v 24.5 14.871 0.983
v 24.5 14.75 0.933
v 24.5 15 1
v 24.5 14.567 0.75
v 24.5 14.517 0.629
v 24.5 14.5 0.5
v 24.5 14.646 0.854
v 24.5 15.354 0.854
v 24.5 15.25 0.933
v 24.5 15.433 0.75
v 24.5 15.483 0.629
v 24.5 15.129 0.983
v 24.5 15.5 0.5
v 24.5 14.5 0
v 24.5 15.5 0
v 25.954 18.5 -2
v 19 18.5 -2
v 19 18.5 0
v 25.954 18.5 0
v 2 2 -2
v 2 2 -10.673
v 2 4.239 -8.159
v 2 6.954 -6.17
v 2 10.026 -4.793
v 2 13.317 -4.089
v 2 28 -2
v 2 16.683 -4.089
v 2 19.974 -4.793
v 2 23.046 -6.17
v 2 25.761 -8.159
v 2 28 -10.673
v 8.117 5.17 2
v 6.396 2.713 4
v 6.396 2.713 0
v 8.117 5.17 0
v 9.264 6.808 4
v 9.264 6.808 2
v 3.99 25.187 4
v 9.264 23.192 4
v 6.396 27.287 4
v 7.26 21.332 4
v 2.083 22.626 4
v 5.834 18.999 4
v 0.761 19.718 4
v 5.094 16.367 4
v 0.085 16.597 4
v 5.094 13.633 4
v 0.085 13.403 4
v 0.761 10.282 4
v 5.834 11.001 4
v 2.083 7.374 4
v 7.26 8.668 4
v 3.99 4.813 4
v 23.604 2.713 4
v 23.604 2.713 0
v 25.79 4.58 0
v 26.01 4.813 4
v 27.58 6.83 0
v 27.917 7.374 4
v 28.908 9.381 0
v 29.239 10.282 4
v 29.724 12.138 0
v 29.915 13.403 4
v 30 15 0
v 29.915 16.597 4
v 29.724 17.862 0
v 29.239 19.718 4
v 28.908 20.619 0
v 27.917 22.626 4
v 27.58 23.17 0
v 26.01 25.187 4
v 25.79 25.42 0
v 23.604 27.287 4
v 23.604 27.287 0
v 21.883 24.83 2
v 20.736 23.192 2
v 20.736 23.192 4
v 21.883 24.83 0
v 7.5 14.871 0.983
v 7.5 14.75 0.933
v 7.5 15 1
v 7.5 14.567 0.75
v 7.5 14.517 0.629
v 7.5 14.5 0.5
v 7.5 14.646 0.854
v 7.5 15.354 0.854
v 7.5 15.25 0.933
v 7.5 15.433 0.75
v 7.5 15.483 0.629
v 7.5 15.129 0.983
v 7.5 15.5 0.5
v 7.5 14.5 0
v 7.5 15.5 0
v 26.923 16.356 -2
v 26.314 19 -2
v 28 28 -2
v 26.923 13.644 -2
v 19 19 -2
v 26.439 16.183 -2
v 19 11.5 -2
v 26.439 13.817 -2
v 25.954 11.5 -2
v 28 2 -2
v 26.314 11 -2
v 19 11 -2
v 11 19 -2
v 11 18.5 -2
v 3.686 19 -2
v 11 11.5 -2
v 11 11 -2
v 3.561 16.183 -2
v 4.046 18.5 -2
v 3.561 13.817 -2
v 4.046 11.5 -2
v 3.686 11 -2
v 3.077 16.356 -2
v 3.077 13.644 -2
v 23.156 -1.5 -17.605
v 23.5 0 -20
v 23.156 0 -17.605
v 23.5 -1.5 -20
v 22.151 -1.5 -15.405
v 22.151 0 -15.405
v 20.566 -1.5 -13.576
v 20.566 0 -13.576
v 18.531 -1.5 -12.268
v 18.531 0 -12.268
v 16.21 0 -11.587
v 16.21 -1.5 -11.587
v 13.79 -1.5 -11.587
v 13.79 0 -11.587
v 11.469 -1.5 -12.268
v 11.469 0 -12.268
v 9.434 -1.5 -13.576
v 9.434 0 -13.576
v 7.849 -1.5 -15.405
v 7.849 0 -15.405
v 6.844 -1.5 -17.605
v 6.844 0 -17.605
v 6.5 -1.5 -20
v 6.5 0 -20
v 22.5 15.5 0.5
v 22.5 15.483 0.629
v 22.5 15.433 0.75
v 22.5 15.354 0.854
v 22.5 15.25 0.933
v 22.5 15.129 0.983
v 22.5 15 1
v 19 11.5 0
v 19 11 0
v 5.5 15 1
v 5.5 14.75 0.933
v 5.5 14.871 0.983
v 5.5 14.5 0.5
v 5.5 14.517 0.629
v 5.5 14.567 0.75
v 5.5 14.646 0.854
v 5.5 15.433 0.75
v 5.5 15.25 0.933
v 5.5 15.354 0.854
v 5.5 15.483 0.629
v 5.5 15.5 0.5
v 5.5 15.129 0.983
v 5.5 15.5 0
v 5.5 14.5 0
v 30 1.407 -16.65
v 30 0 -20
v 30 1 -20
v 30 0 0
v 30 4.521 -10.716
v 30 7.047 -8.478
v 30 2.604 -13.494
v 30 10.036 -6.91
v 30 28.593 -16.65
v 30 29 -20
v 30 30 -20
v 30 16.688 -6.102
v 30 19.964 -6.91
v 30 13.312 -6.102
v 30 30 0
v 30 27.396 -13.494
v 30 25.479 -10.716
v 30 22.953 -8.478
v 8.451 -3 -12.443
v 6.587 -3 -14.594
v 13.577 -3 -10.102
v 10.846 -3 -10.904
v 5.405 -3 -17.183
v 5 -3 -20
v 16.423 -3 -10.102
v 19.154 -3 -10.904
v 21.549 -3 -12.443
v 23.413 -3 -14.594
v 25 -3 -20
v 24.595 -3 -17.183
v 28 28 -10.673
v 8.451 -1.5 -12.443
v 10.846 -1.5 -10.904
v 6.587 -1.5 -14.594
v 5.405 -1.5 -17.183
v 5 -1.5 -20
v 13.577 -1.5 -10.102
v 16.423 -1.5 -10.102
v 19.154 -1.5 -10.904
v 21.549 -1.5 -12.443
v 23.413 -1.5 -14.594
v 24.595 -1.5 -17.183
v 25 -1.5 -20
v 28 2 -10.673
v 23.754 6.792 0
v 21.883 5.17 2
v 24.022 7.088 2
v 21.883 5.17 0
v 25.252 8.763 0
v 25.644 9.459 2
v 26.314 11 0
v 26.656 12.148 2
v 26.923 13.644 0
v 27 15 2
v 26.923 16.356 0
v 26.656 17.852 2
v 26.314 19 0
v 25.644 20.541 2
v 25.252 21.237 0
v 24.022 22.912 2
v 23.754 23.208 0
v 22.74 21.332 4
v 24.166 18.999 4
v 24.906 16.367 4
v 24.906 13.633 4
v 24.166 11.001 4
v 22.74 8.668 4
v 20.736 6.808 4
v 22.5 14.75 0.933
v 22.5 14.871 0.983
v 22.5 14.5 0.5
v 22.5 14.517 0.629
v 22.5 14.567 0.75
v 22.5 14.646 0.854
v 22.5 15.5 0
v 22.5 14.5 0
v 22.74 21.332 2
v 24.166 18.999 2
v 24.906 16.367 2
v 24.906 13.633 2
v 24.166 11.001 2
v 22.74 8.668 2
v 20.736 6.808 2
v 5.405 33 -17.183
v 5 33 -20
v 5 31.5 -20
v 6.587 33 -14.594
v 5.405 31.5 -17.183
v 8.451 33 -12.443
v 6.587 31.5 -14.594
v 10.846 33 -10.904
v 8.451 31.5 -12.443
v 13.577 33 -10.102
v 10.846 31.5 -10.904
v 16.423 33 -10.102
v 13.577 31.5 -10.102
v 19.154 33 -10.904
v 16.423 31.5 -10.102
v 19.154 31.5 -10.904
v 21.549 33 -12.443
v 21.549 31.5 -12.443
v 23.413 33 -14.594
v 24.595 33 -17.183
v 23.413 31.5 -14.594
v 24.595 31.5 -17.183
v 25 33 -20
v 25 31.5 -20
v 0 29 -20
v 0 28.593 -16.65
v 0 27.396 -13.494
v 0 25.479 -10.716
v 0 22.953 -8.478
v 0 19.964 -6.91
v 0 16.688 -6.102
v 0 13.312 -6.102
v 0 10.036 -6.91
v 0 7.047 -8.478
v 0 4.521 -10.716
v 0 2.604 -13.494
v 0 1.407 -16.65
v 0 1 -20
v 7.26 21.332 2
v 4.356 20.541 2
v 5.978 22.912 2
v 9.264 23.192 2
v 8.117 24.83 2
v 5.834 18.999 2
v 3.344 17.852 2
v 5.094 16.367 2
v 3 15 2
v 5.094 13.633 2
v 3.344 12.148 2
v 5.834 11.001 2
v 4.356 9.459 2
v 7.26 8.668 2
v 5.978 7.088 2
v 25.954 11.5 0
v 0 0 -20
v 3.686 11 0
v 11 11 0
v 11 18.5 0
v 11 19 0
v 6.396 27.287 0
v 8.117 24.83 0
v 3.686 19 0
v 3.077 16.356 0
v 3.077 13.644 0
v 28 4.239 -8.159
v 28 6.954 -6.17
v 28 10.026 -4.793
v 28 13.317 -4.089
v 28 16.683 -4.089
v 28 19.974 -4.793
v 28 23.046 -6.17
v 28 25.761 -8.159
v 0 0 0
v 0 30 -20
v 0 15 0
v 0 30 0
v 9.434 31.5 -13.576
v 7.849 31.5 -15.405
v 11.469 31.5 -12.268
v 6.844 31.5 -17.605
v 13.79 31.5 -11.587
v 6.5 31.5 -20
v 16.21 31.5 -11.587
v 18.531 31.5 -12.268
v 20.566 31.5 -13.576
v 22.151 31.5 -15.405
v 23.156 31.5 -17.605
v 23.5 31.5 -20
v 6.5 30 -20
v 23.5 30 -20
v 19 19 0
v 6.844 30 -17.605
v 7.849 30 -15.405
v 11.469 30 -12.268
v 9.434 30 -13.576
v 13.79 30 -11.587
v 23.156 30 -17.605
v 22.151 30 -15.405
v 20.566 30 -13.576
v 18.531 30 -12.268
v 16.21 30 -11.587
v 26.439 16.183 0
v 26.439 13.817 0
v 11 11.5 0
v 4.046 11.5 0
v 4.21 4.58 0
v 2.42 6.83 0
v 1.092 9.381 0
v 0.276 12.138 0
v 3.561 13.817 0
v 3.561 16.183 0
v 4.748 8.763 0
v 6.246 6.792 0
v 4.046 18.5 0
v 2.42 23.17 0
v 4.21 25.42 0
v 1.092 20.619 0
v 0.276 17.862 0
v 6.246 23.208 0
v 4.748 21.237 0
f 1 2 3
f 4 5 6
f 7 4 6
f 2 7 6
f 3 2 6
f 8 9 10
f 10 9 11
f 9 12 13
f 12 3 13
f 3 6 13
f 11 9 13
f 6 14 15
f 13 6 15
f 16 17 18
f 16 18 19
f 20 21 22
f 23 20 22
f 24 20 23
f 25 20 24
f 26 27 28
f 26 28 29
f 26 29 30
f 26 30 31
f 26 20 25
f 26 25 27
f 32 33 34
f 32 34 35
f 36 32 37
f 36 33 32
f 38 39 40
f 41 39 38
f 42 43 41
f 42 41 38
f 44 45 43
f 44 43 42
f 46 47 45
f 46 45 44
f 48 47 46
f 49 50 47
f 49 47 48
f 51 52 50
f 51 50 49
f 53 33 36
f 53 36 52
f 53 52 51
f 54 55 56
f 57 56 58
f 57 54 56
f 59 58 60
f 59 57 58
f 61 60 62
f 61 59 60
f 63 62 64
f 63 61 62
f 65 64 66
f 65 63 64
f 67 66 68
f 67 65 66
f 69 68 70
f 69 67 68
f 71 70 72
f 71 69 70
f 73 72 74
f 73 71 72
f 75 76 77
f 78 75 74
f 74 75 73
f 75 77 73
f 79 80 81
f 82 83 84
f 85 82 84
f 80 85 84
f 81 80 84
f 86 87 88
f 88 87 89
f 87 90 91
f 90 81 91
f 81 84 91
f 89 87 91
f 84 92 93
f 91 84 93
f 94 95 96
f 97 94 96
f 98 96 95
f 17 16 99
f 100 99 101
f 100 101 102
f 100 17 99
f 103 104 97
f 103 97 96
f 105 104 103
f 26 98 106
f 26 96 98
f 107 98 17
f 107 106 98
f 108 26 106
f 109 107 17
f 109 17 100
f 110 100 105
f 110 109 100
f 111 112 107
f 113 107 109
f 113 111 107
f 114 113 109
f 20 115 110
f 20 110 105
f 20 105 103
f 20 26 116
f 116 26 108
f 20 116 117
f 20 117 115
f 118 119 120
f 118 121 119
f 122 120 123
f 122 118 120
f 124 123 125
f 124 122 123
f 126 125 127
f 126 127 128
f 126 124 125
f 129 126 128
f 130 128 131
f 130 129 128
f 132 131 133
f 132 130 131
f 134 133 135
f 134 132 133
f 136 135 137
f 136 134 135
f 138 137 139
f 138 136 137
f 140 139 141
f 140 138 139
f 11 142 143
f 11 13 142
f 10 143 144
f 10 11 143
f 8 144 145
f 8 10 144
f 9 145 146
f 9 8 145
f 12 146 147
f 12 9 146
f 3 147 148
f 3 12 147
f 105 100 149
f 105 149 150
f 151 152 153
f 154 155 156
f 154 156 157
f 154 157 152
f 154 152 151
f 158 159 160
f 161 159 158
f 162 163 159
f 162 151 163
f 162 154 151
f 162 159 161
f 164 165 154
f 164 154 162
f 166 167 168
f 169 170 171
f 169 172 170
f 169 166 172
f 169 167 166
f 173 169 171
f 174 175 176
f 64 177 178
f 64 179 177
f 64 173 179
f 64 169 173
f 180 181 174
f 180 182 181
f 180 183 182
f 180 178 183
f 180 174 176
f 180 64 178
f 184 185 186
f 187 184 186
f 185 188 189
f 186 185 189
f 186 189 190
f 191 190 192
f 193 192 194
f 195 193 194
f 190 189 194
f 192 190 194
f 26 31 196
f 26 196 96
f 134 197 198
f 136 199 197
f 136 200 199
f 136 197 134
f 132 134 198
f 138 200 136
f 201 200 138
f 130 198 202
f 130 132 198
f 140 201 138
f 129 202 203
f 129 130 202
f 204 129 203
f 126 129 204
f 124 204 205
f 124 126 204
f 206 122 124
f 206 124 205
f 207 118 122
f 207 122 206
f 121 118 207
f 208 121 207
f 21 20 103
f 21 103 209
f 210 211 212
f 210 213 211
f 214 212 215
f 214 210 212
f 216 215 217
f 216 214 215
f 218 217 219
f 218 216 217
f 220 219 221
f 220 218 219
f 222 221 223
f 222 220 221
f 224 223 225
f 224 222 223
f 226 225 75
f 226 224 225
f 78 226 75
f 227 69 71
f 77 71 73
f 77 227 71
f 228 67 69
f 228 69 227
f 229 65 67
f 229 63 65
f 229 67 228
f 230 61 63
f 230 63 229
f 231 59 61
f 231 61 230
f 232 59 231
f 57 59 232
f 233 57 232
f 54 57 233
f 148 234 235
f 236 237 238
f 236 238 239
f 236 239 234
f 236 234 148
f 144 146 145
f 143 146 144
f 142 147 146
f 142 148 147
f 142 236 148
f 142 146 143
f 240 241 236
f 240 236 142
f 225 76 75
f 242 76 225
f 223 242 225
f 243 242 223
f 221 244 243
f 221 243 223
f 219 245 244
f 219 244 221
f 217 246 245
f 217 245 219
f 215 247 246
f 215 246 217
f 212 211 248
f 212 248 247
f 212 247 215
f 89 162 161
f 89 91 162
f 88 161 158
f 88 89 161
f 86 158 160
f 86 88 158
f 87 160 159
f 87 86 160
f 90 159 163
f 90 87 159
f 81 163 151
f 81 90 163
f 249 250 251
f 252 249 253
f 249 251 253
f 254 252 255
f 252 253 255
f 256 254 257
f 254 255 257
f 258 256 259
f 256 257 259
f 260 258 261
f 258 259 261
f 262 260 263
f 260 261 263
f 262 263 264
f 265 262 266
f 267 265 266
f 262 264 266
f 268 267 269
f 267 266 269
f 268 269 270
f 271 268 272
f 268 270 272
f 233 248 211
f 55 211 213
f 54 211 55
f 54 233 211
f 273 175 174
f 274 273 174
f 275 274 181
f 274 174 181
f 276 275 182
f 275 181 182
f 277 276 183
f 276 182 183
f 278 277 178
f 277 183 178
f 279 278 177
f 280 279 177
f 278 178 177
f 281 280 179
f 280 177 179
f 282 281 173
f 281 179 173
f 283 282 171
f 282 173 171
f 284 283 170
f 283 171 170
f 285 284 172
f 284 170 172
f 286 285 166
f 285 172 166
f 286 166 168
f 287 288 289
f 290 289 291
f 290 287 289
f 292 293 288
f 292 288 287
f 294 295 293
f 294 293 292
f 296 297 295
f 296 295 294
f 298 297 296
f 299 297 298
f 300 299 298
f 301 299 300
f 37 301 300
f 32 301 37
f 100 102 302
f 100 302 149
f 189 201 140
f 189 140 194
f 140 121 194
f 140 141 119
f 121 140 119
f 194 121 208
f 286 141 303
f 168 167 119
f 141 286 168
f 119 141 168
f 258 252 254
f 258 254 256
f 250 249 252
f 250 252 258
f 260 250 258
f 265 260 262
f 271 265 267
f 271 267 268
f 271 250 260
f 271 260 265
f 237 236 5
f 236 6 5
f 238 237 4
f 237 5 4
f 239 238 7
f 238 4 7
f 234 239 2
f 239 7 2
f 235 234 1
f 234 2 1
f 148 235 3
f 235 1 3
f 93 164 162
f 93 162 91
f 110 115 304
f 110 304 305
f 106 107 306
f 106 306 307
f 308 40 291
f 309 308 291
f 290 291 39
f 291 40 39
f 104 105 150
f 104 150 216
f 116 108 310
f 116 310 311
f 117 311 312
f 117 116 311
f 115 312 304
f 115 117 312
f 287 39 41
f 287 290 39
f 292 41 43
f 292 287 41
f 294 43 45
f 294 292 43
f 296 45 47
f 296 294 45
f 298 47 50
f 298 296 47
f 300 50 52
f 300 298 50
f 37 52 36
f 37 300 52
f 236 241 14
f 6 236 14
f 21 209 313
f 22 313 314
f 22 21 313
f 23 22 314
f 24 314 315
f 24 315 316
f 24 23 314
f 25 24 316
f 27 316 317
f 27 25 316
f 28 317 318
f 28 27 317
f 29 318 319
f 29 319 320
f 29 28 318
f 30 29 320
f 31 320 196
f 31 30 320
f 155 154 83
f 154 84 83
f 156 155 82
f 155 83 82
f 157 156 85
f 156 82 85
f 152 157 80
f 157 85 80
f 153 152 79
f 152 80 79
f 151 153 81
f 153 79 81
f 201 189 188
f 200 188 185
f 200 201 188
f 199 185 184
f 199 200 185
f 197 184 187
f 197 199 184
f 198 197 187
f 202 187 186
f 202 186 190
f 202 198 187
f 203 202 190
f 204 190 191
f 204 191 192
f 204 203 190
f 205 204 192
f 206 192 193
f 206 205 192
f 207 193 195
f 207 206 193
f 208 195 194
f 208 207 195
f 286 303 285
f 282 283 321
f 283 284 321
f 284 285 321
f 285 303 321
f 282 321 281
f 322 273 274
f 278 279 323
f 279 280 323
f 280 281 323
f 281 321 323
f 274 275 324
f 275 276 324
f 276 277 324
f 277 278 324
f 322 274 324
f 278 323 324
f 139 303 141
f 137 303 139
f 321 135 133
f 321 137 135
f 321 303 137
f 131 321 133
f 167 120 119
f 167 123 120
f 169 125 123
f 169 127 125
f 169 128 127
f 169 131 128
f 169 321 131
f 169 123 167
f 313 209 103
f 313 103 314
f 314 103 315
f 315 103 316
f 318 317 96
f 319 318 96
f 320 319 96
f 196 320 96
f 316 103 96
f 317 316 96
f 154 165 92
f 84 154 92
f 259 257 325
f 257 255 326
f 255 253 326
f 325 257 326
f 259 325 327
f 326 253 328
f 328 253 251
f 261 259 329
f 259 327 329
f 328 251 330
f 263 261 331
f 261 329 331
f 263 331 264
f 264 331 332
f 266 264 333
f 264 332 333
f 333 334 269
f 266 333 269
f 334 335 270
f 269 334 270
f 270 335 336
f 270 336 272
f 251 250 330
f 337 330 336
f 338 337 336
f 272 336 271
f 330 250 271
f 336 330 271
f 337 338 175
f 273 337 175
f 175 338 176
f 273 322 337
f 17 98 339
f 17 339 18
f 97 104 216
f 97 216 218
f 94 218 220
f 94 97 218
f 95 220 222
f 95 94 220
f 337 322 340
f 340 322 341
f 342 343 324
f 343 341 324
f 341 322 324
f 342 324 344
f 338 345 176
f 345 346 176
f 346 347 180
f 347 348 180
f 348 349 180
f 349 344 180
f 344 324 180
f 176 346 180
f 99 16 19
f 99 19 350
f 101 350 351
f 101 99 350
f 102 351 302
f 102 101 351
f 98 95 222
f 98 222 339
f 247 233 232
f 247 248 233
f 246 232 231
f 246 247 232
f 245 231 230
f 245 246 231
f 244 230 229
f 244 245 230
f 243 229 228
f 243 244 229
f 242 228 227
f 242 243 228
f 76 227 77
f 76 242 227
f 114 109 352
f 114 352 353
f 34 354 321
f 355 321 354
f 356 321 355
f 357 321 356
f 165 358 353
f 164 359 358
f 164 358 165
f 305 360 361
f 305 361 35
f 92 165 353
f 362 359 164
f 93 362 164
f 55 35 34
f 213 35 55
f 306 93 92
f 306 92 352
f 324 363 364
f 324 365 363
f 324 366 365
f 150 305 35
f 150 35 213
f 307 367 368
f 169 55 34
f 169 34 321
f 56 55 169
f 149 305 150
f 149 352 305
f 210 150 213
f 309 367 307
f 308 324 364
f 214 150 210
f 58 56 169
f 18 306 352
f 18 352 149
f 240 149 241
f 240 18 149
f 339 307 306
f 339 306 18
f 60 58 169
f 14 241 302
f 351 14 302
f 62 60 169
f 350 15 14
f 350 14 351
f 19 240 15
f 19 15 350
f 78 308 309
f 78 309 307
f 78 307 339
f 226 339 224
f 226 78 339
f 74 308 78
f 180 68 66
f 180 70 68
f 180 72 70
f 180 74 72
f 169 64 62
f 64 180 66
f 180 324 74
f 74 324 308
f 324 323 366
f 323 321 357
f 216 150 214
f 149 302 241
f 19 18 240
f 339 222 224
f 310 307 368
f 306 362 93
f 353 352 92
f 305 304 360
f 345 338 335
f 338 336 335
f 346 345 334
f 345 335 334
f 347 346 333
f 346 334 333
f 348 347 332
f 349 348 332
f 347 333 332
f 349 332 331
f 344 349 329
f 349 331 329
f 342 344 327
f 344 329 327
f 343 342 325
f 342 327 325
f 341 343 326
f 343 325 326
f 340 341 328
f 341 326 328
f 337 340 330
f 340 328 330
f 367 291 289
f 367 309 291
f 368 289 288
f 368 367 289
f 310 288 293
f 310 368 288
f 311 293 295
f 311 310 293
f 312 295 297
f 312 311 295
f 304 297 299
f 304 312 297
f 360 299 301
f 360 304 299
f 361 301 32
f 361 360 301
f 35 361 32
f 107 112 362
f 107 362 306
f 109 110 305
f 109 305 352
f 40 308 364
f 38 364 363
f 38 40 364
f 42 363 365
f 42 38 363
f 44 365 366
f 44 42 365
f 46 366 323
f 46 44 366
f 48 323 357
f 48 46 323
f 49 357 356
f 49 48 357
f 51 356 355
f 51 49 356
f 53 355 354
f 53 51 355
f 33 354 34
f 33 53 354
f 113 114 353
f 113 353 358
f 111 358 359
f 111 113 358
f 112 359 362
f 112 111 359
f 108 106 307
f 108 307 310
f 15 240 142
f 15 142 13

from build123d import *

# Parameters (mm, degrees)
SKETCH4_W           = 30
SKETCH4_H           = 30
BOSS_EXTRUDE2_DEPTH = 20
SKETCH5_R           = 14
CUT_EXTRUDE1_DEPTH  = 47.904157598
SKETCH6_W           = 2
SKETCH6_H           = 1
BOSS_EXTRUDE3_DEPTH = 1
SHELL6_START        = 2
SHELL6_DEPTH        = 26
FILLET1_R           = 0.5
CUT_EXTRUDE2_DEPTH  = 4
CUT_EXTRUDE11_START = -2
CUT_EXTRUDE11_DEPTH = 2
BOSS_EXTRUDE4_DEPTH = 3
SKETCH12_W          = 1.5
SKETCH12_H          = 1.5


# Read off the part's stored shape, not the designer's step: Shell6
with BuildPart() as part:
    # Sketch4 → Boss-Extrude2 (new body)
    with BuildSketch(Plane.XY):
        with Locations((15, 15)):
            Rectangle(SKETCH4_W, SKETCH4_H)
    extrude(amount=-BOSS_EXTRUDE2_DEPTH)

    # Sketch5 → Cut-Extrude1 (cut, through all)
    with BuildSketch(Plane(origin=(30, 0, 0), x_dir=(0, 0, -1), z_dir=(1, 0, 0))):
        with Locations((20, 15)):
            Circle(SKETCH5_R)
    extrude(amount=-CUT_EXTRUDE1_DEPTH, mode=Mode.SUBTRACT)

    # Sketch6 → Boss-Extrude3 (add)
    with BuildSketch(Plane.XY):
        with Locations((23.5, 15)):
            Rectangle(SKETCH6_W, SKETCH6_H)
        with Locations((6.5, 15)):
            Rectangle(SKETCH6_W, SKETCH6_H)
    extrude(amount=BOSS_EXTRUDE3_DEPTH)

    # Shell6 outline → Shell6 (cut)
    with BuildSketch(Plane.YZ.offset(SHELL6_START)):
        with BuildLine():
            Line((28, -2), (2, -2))
            Line((2, -2), (2, -10.672620947))
            ThreePointArc((2, -10.672620947), (15, -4), (28, -10.672620947))
            Line((28, -10.672620947), (28, -2))
        make_face()
    extrude(amount=SHELL6_DEPTH, mode=Mode.SUBTRACT)

    # Fillet1
    fillet1_edges = [part.edges().sort_by_distance(p)[0] for p in [
        (23.5, 15.5, 1),
        (23.5, 14.5, 1),
        (6.5, 15.5, 1),
        (6.5, 14.5, 1),
    ]]
    fillet(fillet1_edges, radius=FILLET1_R - 0.0001)  # a hair under: the kernel refuses the full size

    # Sketch7 → Revolve1 (revolve)
    with BuildSketch(Plane(origin=(0, 15, 0), x_dir=(-1, 0, 0), z_dir=(0, -1, 0))):
        Polygon((0, 0), (0, -4), (-5, -4), (-5, -2), (-3, -2), (-3, 0), align=None)
    revolve(axis=Axis((15, 15, 0), (0, 0, 1)))

    # Sketch9 → Cut-Extrude2 (cut)
    with BuildSketch(Plane.XY.offset(4)):
        with BuildLine():
            Line((6.396353455, 27.287280664), (9.264235636, 23.191520443))
            ThreePointArc((9.264235636, 23.191520443), (15, 25), (20.735764364, 23.191520443))
            Line((20.735764364, 23.191520443), (23.603646545, 27.287280664))
            ThreePointArc((23.603646545, 27.287280664), (15, 30), (6.396353455, 27.287280664))
        make_face()
    cut_extrude2 = extrude(amount=-CUT_EXTRUDE2_DEPTH, mode=Mode.SUBTRACT)

    # Mirror1: Cut-Extrude2 across plane
    add(cut_extrude2.mirror(Plane(origin=(0, 15, 0), x_dir=(0, 0, 1), z_dir=(0, -1, 0))), mode=Mode.SUBTRACT)

    # Sketch10 → Cut-Extrude11 (cut)
    with BuildSketch(Plane.XY.offset(CUT_EXTRUDE11_START)):
        with BuildLine():
            Line((11, 19), (3.686291501, 19))
            ThreePointArc((3.686291501, 19), (3, 15), (3.686291501, 11))
            Line((3.686291501, 11), (11, 11))
            Line((11, 11), (11, 11.5))
            Line((11, 11.5), (4.04554885, 11.5))
            ThreePointArc((4.04554885, 11.5), (3.5, 15), (4.04554885, 18.5))
            Line((4.04554885, 18.5), (11, 18.5))
            Line((11, 18.5), (11, 19))
        make_face()
        with BuildLine():
            Line((26.313708499, 19), (19, 19))
            Line((19, 19), (19, 18.5))
            Line((19, 18.5), (25.95445115, 18.5))
            ThreePointArc((25.95445115, 18.5), (26.5, 15), (25.95445115, 11.5))
            Line((25.95445115, 11.5), (19, 11.5))
            Line((19, 11.5), (19, 11))
            Line((19, 11), (26.313708499, 11))
            ThreePointArc((26.313708499, 11), (27, 15), (26.313708499, 19))
        make_face()
    extrude(amount=CUT_EXTRUDE11_DEPTH, mode=Mode.SUBTRACT)

    # Sketch11 → Boss-Extrude4 (add)
    with BuildSketch(Plane(origin=(0, 30, 0), x_dir=(1, 0, 0), z_dir=(0, 1, 0))):
        with BuildLine():
            Line((25, 20), (5, 20))
            ThreePointArc((5, 20), (15, 10), (25, 20))
        make_face()
    boss_extrude4 = extrude(amount=BOSS_EXTRUDE4_DEPTH)

    # Sketch12 → Cut-Revolve1 (revolve, cut)
    with BuildSketch(Plane(origin=(0, 0, -20), x_dir=(-1, 0, 0), z_dir=(0, 0, -1))):
        with Locations((-5.75, 30.75)):
            Rectangle(SKETCH12_W, SKETCH12_H)
    cut_revolve1 = revolve(axis=Axis((15, 33, -20), (0, -1, 0)), mode=Mode.SUBTRACT)

    # Mirror2: Boss-Extrude4, Cut-Revolve1 across plane
    add(boss_extrude4.mirror(Plane(origin=(0, 15, 0), x_dir=(0, 0, 1), z_dir=(0, -1, 0))))
    add(cut_revolve1.mirror(Plane(origin=(0, 15, 0), x_dir=(0, 0, 1), z_dir=(0, -1, 0))), mode=Mode.SUBTRACT)


solid = part.part
